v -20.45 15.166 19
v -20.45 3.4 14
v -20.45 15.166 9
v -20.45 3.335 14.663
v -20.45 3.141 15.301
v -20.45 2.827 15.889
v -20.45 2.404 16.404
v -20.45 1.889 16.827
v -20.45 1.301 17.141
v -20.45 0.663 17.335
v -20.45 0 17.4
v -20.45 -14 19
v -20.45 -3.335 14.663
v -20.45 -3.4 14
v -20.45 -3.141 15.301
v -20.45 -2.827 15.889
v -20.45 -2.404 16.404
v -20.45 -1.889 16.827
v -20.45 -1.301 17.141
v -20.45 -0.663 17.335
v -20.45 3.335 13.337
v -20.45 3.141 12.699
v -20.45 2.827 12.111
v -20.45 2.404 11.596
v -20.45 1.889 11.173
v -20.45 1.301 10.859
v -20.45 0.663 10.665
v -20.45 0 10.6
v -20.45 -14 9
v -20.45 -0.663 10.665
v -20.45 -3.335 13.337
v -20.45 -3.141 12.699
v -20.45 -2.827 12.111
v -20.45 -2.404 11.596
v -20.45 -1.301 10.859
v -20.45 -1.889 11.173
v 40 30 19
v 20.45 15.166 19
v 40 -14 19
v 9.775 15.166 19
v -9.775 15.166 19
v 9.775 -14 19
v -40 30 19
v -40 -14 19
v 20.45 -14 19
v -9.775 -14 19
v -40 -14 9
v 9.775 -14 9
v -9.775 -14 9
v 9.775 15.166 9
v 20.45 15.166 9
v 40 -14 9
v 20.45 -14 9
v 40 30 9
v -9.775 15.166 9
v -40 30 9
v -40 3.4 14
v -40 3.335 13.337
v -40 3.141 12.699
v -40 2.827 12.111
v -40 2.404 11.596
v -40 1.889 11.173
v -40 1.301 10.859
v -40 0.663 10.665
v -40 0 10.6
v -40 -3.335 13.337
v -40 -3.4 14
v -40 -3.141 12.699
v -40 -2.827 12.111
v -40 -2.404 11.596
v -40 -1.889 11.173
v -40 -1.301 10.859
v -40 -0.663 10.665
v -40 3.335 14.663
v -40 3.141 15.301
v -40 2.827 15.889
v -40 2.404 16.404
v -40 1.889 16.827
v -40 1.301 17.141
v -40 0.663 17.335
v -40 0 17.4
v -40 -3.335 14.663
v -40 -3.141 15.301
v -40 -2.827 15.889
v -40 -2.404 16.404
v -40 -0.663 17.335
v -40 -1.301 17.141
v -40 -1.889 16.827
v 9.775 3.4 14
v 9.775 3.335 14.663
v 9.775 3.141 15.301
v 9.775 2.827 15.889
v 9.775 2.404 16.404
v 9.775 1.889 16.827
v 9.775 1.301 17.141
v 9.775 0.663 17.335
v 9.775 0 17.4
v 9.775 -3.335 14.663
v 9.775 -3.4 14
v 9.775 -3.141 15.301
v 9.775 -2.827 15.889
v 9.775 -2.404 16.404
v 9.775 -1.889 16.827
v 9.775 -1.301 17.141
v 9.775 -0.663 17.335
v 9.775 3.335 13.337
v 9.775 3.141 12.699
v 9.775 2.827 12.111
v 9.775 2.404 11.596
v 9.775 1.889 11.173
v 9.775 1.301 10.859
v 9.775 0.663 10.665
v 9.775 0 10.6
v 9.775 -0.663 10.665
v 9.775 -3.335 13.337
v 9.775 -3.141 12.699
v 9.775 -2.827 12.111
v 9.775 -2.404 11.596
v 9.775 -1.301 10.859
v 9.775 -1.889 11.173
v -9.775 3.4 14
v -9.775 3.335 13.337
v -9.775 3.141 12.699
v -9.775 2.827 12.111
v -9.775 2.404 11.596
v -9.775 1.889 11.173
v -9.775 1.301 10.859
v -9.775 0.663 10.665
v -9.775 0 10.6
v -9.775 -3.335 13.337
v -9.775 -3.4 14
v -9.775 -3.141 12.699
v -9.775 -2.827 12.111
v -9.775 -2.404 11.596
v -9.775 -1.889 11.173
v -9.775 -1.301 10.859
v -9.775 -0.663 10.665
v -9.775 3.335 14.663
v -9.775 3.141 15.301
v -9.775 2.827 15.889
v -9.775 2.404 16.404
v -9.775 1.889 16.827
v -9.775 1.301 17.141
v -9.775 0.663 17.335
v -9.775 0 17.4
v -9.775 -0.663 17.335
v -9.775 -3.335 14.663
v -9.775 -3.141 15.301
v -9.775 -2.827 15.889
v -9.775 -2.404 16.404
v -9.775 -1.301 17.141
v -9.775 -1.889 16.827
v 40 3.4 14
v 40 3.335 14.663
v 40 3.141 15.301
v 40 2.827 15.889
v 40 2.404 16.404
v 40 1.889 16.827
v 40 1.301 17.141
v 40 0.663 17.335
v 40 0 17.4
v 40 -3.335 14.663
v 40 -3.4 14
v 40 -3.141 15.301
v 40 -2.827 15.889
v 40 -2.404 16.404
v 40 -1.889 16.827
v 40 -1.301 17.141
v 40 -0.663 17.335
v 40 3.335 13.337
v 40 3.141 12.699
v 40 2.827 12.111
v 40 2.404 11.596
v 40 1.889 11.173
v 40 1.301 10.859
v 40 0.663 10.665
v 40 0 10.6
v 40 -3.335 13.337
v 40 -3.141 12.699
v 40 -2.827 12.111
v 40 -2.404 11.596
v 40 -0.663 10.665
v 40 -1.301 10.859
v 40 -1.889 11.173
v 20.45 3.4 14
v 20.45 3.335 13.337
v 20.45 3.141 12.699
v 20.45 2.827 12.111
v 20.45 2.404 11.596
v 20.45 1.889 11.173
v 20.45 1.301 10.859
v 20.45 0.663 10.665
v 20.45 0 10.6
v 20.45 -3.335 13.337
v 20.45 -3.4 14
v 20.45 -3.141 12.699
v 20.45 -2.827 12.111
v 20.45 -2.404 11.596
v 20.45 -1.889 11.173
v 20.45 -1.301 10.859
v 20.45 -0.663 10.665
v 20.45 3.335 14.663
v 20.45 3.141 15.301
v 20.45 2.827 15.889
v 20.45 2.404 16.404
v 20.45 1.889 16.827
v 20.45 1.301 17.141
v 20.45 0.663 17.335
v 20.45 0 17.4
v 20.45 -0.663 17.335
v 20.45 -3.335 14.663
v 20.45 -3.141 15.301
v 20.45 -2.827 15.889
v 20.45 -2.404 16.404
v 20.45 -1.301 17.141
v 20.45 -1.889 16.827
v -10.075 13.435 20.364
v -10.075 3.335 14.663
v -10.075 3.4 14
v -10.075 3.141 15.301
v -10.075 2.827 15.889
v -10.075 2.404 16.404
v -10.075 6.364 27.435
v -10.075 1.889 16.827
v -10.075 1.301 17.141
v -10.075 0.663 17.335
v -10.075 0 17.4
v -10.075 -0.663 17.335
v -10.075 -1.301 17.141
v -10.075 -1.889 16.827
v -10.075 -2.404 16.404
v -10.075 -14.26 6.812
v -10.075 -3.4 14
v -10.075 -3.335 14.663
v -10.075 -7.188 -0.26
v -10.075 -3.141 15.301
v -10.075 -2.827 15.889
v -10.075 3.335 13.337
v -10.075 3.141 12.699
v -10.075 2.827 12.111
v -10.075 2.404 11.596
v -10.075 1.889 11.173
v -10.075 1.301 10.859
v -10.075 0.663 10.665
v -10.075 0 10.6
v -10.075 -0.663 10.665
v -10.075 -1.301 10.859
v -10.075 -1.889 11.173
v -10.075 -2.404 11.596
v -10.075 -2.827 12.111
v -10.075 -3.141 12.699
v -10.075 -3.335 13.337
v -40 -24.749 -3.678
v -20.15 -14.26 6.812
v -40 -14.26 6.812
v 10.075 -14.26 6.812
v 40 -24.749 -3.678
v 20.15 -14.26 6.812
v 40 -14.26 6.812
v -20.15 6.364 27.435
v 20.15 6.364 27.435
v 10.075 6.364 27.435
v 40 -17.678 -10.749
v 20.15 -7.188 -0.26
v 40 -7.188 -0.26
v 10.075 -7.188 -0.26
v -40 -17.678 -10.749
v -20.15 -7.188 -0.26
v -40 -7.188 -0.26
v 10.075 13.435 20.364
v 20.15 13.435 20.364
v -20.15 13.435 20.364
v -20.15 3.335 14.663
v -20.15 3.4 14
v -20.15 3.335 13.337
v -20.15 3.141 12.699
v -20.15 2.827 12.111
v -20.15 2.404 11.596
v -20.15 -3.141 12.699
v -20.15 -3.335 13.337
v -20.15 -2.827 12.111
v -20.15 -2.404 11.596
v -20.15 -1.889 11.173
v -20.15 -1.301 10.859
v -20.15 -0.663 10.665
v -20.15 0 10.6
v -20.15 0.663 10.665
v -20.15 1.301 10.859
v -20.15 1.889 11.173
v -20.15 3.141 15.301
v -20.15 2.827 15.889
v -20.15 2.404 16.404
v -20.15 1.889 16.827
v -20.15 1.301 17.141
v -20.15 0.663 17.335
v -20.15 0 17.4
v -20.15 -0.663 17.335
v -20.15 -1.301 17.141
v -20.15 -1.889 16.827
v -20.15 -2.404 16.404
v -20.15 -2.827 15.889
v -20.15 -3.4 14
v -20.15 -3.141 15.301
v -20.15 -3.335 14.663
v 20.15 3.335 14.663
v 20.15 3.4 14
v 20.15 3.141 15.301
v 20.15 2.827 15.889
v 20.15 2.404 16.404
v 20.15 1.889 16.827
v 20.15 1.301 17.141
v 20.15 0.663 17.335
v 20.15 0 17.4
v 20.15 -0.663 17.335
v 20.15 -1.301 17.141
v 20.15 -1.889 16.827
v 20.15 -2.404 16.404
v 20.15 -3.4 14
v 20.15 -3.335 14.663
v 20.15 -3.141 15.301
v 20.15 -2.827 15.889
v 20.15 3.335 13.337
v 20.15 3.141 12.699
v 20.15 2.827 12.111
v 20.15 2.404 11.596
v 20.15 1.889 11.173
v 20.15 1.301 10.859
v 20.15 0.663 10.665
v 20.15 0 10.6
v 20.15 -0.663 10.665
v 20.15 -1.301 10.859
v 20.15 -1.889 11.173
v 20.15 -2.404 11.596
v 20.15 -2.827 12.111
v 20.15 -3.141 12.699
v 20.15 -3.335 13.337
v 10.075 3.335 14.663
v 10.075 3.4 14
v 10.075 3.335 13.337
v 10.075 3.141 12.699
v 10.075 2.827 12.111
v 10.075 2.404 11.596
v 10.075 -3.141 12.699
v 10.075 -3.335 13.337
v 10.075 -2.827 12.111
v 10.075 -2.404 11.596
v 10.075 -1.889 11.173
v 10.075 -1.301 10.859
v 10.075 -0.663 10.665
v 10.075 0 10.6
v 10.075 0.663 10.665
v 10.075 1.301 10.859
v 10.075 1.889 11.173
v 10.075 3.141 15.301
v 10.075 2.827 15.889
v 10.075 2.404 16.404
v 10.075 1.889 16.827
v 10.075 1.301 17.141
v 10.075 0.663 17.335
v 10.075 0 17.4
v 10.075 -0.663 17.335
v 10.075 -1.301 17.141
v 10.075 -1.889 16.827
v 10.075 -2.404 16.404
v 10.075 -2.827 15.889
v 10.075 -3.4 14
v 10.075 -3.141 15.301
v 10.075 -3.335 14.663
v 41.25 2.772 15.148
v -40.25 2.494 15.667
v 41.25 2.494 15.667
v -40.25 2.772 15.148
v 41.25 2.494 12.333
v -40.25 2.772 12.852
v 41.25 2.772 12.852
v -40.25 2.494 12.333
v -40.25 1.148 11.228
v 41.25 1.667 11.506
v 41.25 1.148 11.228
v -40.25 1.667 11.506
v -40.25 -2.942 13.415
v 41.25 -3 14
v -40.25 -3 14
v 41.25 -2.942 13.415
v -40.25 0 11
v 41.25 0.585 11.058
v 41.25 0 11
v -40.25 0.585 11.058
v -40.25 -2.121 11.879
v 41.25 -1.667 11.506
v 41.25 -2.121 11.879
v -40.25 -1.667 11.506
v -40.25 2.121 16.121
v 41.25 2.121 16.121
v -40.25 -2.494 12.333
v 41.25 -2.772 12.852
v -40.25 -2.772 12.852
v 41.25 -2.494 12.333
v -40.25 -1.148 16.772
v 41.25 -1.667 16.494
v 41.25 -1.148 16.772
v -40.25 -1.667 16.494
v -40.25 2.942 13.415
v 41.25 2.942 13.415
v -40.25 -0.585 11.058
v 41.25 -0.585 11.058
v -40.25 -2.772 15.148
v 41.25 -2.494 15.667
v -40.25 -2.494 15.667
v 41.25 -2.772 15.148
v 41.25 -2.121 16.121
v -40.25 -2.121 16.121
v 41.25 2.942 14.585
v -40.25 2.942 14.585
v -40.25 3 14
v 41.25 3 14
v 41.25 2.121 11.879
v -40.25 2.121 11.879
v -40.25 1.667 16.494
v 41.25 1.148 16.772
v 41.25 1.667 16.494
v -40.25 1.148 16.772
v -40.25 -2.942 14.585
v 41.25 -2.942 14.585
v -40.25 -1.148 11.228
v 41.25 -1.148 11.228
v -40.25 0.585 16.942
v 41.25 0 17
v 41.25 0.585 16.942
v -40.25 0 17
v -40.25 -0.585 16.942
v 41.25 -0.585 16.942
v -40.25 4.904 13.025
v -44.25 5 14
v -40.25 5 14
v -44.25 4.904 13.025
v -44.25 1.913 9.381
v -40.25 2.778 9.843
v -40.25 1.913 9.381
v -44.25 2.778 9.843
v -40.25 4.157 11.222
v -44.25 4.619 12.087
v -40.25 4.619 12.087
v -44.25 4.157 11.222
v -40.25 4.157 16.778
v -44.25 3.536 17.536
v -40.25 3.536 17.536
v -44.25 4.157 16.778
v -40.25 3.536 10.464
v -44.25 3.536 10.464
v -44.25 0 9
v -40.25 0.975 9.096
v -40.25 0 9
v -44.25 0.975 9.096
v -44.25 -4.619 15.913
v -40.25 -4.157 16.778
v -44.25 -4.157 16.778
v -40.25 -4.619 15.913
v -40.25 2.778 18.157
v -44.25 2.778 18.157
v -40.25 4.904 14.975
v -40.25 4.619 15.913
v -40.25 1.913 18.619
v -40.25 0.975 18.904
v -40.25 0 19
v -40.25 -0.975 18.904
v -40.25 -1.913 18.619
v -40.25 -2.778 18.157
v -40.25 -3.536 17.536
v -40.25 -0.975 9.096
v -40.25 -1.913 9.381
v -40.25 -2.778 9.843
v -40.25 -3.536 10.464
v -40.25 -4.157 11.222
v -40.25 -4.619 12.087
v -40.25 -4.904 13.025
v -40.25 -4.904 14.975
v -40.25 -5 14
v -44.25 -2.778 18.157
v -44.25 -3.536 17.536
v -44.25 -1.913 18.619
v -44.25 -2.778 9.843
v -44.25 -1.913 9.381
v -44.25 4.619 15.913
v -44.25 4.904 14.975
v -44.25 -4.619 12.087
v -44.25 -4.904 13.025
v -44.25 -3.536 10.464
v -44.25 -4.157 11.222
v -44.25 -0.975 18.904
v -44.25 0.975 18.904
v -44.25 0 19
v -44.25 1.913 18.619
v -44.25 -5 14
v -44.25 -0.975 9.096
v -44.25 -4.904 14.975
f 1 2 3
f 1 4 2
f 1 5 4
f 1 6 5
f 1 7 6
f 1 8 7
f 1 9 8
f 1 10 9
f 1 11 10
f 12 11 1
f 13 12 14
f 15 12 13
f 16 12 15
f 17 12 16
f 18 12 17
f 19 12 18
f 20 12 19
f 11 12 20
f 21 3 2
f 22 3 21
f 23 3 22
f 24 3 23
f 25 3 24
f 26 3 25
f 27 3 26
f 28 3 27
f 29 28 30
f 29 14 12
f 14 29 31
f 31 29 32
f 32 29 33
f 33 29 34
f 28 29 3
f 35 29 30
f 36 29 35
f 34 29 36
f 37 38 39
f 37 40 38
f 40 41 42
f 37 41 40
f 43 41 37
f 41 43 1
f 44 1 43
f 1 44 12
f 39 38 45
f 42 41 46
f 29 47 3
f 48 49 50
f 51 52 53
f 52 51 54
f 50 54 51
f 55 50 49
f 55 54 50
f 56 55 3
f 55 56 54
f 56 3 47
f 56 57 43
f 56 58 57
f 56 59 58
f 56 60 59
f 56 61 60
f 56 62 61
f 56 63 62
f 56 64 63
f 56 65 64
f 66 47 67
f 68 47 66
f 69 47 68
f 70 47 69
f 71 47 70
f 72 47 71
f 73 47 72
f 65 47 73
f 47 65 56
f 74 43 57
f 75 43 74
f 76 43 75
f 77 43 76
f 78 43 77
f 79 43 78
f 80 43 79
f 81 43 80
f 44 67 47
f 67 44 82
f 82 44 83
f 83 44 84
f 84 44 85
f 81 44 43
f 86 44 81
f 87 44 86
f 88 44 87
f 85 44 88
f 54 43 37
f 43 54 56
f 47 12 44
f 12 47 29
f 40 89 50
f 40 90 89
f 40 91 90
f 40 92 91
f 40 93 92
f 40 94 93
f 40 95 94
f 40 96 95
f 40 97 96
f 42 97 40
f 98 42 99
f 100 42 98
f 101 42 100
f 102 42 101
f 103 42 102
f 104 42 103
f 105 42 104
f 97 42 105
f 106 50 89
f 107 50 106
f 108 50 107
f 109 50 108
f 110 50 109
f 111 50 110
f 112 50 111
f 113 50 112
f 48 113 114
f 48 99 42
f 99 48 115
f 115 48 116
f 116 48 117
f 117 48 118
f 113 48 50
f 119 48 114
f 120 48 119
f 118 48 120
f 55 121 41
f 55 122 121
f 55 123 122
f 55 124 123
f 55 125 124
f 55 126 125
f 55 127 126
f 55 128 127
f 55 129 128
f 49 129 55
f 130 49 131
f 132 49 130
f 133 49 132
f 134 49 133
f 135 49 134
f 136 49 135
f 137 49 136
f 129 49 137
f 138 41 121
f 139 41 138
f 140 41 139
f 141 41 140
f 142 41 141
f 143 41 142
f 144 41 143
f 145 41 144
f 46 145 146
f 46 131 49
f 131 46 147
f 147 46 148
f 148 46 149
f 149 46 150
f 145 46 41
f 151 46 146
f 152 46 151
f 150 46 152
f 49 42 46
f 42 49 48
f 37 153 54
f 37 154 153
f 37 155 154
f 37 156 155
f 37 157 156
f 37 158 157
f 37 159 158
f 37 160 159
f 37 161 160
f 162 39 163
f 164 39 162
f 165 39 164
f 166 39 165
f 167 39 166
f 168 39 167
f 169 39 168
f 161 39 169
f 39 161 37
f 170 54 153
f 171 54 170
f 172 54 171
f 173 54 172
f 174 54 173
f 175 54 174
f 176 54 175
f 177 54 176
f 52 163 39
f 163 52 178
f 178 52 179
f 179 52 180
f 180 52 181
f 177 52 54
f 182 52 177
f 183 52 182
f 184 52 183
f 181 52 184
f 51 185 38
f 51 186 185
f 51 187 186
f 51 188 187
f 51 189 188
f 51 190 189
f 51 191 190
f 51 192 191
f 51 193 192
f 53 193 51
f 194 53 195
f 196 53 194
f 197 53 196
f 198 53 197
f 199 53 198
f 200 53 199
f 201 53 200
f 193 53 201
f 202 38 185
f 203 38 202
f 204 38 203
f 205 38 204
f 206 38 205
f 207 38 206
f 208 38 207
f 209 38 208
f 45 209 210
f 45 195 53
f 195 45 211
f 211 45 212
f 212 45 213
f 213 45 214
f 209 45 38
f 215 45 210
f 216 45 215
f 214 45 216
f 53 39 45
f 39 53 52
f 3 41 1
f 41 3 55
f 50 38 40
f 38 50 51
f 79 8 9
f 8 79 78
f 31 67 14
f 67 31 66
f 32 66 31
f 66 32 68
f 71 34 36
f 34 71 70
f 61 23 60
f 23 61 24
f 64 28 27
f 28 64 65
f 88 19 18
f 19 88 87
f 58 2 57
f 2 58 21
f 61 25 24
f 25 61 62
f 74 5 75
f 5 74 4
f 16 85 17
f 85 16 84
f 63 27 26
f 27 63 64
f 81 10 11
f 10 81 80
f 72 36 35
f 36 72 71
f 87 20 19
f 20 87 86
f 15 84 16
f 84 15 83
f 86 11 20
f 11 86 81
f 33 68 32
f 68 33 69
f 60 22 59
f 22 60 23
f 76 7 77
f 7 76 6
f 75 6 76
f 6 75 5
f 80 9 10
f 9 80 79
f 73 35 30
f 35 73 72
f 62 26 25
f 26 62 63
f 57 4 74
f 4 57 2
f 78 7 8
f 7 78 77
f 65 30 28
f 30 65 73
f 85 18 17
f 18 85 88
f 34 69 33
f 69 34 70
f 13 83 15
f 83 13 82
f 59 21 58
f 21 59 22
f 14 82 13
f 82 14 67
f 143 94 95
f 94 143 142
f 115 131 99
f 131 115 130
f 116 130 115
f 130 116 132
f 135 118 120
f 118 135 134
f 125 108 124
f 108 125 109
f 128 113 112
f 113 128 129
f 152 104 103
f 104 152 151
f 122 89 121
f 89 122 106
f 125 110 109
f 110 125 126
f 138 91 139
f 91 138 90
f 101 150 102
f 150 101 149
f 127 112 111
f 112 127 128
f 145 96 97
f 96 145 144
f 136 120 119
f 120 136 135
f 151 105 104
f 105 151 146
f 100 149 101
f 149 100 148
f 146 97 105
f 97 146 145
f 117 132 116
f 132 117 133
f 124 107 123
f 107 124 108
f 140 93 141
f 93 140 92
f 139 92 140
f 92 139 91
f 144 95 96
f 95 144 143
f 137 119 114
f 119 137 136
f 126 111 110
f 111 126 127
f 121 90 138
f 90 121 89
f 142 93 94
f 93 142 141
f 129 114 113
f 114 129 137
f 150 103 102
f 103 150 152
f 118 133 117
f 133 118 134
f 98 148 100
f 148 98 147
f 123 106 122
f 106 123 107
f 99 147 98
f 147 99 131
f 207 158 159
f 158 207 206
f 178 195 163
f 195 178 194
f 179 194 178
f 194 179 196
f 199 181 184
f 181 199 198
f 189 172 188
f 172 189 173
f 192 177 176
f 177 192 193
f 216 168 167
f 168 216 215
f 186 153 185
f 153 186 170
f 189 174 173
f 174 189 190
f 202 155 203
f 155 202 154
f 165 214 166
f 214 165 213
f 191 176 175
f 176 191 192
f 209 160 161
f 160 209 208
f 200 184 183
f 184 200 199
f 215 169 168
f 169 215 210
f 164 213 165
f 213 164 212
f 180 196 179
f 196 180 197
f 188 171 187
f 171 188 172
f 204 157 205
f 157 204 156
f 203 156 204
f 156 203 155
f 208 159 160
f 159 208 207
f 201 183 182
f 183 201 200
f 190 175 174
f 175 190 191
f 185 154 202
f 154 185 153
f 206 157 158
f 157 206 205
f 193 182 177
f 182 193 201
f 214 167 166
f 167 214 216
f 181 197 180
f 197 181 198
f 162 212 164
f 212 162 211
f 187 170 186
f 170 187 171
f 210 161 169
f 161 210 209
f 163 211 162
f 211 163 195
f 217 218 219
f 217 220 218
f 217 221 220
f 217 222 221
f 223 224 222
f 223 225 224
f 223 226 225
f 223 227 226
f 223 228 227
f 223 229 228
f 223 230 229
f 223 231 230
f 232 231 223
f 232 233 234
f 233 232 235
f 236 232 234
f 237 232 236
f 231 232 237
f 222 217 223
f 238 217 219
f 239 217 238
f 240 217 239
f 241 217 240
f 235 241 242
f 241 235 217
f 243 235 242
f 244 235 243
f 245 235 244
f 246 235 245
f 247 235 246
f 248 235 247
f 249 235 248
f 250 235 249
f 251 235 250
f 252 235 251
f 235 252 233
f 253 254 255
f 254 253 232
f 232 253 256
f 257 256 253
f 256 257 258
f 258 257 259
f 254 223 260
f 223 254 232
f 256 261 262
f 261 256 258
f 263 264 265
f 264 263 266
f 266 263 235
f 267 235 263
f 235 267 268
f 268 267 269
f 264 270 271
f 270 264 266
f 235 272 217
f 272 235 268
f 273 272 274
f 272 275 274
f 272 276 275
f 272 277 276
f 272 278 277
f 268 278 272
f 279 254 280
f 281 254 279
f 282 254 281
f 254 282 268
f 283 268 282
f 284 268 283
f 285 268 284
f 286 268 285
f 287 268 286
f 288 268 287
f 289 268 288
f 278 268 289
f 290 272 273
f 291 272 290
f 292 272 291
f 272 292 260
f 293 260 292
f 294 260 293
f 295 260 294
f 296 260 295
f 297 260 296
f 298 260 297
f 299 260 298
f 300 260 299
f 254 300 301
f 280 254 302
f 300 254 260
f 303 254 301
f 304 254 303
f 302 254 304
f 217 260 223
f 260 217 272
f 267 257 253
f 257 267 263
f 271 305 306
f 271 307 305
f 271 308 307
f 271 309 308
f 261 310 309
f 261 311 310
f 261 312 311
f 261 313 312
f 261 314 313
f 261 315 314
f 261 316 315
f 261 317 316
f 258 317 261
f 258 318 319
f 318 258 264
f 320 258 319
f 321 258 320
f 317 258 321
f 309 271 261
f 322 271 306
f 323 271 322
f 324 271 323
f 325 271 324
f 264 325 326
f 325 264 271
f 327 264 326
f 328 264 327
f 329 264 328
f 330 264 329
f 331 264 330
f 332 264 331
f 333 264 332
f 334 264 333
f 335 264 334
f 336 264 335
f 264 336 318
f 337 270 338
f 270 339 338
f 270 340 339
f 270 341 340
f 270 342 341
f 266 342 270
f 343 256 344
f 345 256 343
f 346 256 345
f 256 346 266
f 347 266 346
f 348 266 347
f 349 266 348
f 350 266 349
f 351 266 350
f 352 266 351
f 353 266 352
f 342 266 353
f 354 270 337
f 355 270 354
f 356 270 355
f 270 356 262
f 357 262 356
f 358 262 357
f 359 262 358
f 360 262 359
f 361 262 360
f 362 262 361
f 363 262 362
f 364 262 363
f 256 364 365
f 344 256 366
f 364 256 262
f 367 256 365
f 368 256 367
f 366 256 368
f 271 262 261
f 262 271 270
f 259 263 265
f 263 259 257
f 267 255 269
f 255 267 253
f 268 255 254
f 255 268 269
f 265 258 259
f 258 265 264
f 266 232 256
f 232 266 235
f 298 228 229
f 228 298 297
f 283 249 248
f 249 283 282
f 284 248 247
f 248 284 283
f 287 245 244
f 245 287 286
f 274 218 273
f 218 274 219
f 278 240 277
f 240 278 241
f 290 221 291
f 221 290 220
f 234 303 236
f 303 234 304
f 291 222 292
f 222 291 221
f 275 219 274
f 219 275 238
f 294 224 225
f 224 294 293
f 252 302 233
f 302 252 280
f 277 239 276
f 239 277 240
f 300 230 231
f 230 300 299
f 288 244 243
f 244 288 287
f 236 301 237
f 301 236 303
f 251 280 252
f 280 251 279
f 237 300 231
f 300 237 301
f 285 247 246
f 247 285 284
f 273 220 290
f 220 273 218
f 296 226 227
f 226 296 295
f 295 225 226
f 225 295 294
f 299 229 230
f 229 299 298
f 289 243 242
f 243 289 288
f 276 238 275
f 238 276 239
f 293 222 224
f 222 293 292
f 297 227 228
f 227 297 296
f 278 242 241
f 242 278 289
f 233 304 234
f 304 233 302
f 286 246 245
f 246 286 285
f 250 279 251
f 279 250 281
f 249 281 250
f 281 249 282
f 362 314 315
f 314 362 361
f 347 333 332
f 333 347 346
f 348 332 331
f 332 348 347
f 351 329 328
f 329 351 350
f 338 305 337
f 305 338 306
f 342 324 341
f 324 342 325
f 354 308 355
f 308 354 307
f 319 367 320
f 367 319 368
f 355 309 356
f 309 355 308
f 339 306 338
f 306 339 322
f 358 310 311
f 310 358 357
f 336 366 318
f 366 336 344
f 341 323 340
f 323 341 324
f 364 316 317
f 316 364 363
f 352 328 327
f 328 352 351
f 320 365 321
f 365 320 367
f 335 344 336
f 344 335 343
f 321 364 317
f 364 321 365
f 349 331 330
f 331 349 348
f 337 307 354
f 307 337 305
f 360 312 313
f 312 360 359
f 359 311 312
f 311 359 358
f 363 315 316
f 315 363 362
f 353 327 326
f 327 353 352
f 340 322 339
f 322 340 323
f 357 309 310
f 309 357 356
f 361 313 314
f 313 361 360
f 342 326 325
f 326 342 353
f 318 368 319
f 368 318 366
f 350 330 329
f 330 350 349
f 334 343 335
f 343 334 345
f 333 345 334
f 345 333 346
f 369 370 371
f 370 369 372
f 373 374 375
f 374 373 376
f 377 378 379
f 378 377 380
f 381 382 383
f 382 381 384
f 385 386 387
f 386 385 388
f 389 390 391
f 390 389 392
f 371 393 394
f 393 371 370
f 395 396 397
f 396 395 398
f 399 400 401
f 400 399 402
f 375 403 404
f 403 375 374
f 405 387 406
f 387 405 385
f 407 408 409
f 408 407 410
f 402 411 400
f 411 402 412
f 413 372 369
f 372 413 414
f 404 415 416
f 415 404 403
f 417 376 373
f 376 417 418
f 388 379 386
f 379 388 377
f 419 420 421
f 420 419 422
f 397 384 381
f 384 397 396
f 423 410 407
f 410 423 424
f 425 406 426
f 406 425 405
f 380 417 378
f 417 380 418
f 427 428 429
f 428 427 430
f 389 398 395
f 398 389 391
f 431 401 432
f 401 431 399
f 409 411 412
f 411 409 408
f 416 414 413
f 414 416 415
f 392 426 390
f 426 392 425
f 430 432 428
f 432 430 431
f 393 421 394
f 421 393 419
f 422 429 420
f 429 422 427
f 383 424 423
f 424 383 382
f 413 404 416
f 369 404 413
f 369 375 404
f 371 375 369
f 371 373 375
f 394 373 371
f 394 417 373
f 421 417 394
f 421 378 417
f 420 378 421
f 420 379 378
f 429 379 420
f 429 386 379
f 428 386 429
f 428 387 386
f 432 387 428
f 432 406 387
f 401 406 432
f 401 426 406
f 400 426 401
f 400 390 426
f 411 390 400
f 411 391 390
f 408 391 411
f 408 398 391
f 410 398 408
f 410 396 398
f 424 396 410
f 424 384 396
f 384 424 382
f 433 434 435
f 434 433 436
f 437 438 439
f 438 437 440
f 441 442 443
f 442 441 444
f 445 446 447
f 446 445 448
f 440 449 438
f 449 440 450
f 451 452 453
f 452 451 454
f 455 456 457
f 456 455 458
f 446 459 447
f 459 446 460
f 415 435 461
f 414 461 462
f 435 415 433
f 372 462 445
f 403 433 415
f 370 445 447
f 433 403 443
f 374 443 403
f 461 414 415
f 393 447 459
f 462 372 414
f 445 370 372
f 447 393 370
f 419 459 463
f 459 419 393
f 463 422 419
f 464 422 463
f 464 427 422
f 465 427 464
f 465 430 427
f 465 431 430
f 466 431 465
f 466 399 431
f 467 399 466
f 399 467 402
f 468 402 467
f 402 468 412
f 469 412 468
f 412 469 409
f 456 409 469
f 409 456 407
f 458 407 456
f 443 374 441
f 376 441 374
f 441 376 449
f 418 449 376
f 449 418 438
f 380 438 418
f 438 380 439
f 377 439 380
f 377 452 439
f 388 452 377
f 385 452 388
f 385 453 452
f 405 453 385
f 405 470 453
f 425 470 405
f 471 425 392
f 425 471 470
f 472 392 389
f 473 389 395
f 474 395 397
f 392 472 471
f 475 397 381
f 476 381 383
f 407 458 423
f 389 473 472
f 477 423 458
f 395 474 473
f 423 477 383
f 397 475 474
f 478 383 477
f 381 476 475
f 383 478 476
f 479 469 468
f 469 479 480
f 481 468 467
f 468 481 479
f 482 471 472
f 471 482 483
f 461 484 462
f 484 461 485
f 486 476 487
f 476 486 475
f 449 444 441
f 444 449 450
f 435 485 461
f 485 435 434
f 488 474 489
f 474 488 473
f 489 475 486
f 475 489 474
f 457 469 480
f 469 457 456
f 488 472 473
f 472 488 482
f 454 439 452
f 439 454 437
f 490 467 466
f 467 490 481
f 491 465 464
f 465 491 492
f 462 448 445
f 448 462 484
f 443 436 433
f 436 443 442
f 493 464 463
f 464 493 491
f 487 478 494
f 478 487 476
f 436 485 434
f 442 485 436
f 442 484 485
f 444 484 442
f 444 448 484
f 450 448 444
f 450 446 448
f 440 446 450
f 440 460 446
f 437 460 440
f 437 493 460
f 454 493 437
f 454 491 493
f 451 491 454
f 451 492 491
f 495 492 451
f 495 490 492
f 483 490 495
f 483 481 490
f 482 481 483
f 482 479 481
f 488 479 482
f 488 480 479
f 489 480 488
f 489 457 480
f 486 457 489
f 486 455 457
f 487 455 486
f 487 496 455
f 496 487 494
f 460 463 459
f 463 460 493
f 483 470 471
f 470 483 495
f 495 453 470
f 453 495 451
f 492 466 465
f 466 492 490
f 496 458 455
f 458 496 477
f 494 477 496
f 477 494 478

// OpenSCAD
$fn = 32;

// ------------------------------------------------------------------------
// Butt hinge: hinge 80 mm, leaf swung 45 deg
// Every part is its own module, assembly() places every instance.
// ------------------------------------------------------------------------

// --- part 1 ---
module hinge_base() {
  difference() {
    union() {
      translate([-40, -14, -5]) cube([19.55, 44, 10]);
      translate([-9.775, -14, -5]) cube([19.55, 44, 10]);
      translate([20.45, -14, -5]) cube([19.55, 44, 10]);
      translate([-40, 15.166, -5]) cube([80, 14.834, 10]);
    }
    translate([-30.225, 0, 0]) rotate([0, 90, 0]) cylinder(h = 21.55, d = 6.8, center = true);
    translate([0, 0, 0]) rotate([0, 90, 0]) cylinder(h = 21.55, d = 6.8, center = true);
    translate([30.225, 0, 0]) rotate([0, 90, 0]) cylinder(h = 21.55, d = 6.8, center = true);
  }
}

// --- part 2 ---
module hinge_mover() {
  difference() {
    union() {
      translate([-20.15, -30, -5]) cube([10.075, 44, 10]);
      translate([10.075, -30, -5]) cube([10.075, 44, 10]);
      translate([-40, -30, -5]) cube([80, 14.834, 10]);
    }
    translate([-15.113, 0, 0]) rotate([0, 90, 0]) cylinder(h = 12.075, d = 6.8, center = true);
    translate([15.113, 0, 0]) rotate([0, 90, 0]) cylinder(h = 12.075, d = 6.8, center = true);
  }
}

// --- part 3 ---
module hinge_pin() {
  rotate([0, 90, 0]) cylinder(h = 82.5, d = 6, center = true);
  translate([-44.25, 0, 0]) rotate([0, 90, 0]) cylinder(h = 4, d = 10);
}

// --- assembly ---
module assembly() {
  color([0.80, 0.24, 0.20]) translate([0, 0, 14]) rotate([0, 0, 0]) hinge_base();
  color([0.20, 0.45, 0.75]) translate([0, 0, 14]) rotate([45, 0, 0]) hinge_mover();
  color([0.25, 0.62, 0.32]) translate([0, 0, 14]) rotate([0, 0, 0]) hinge_pin();
}

assembly();
